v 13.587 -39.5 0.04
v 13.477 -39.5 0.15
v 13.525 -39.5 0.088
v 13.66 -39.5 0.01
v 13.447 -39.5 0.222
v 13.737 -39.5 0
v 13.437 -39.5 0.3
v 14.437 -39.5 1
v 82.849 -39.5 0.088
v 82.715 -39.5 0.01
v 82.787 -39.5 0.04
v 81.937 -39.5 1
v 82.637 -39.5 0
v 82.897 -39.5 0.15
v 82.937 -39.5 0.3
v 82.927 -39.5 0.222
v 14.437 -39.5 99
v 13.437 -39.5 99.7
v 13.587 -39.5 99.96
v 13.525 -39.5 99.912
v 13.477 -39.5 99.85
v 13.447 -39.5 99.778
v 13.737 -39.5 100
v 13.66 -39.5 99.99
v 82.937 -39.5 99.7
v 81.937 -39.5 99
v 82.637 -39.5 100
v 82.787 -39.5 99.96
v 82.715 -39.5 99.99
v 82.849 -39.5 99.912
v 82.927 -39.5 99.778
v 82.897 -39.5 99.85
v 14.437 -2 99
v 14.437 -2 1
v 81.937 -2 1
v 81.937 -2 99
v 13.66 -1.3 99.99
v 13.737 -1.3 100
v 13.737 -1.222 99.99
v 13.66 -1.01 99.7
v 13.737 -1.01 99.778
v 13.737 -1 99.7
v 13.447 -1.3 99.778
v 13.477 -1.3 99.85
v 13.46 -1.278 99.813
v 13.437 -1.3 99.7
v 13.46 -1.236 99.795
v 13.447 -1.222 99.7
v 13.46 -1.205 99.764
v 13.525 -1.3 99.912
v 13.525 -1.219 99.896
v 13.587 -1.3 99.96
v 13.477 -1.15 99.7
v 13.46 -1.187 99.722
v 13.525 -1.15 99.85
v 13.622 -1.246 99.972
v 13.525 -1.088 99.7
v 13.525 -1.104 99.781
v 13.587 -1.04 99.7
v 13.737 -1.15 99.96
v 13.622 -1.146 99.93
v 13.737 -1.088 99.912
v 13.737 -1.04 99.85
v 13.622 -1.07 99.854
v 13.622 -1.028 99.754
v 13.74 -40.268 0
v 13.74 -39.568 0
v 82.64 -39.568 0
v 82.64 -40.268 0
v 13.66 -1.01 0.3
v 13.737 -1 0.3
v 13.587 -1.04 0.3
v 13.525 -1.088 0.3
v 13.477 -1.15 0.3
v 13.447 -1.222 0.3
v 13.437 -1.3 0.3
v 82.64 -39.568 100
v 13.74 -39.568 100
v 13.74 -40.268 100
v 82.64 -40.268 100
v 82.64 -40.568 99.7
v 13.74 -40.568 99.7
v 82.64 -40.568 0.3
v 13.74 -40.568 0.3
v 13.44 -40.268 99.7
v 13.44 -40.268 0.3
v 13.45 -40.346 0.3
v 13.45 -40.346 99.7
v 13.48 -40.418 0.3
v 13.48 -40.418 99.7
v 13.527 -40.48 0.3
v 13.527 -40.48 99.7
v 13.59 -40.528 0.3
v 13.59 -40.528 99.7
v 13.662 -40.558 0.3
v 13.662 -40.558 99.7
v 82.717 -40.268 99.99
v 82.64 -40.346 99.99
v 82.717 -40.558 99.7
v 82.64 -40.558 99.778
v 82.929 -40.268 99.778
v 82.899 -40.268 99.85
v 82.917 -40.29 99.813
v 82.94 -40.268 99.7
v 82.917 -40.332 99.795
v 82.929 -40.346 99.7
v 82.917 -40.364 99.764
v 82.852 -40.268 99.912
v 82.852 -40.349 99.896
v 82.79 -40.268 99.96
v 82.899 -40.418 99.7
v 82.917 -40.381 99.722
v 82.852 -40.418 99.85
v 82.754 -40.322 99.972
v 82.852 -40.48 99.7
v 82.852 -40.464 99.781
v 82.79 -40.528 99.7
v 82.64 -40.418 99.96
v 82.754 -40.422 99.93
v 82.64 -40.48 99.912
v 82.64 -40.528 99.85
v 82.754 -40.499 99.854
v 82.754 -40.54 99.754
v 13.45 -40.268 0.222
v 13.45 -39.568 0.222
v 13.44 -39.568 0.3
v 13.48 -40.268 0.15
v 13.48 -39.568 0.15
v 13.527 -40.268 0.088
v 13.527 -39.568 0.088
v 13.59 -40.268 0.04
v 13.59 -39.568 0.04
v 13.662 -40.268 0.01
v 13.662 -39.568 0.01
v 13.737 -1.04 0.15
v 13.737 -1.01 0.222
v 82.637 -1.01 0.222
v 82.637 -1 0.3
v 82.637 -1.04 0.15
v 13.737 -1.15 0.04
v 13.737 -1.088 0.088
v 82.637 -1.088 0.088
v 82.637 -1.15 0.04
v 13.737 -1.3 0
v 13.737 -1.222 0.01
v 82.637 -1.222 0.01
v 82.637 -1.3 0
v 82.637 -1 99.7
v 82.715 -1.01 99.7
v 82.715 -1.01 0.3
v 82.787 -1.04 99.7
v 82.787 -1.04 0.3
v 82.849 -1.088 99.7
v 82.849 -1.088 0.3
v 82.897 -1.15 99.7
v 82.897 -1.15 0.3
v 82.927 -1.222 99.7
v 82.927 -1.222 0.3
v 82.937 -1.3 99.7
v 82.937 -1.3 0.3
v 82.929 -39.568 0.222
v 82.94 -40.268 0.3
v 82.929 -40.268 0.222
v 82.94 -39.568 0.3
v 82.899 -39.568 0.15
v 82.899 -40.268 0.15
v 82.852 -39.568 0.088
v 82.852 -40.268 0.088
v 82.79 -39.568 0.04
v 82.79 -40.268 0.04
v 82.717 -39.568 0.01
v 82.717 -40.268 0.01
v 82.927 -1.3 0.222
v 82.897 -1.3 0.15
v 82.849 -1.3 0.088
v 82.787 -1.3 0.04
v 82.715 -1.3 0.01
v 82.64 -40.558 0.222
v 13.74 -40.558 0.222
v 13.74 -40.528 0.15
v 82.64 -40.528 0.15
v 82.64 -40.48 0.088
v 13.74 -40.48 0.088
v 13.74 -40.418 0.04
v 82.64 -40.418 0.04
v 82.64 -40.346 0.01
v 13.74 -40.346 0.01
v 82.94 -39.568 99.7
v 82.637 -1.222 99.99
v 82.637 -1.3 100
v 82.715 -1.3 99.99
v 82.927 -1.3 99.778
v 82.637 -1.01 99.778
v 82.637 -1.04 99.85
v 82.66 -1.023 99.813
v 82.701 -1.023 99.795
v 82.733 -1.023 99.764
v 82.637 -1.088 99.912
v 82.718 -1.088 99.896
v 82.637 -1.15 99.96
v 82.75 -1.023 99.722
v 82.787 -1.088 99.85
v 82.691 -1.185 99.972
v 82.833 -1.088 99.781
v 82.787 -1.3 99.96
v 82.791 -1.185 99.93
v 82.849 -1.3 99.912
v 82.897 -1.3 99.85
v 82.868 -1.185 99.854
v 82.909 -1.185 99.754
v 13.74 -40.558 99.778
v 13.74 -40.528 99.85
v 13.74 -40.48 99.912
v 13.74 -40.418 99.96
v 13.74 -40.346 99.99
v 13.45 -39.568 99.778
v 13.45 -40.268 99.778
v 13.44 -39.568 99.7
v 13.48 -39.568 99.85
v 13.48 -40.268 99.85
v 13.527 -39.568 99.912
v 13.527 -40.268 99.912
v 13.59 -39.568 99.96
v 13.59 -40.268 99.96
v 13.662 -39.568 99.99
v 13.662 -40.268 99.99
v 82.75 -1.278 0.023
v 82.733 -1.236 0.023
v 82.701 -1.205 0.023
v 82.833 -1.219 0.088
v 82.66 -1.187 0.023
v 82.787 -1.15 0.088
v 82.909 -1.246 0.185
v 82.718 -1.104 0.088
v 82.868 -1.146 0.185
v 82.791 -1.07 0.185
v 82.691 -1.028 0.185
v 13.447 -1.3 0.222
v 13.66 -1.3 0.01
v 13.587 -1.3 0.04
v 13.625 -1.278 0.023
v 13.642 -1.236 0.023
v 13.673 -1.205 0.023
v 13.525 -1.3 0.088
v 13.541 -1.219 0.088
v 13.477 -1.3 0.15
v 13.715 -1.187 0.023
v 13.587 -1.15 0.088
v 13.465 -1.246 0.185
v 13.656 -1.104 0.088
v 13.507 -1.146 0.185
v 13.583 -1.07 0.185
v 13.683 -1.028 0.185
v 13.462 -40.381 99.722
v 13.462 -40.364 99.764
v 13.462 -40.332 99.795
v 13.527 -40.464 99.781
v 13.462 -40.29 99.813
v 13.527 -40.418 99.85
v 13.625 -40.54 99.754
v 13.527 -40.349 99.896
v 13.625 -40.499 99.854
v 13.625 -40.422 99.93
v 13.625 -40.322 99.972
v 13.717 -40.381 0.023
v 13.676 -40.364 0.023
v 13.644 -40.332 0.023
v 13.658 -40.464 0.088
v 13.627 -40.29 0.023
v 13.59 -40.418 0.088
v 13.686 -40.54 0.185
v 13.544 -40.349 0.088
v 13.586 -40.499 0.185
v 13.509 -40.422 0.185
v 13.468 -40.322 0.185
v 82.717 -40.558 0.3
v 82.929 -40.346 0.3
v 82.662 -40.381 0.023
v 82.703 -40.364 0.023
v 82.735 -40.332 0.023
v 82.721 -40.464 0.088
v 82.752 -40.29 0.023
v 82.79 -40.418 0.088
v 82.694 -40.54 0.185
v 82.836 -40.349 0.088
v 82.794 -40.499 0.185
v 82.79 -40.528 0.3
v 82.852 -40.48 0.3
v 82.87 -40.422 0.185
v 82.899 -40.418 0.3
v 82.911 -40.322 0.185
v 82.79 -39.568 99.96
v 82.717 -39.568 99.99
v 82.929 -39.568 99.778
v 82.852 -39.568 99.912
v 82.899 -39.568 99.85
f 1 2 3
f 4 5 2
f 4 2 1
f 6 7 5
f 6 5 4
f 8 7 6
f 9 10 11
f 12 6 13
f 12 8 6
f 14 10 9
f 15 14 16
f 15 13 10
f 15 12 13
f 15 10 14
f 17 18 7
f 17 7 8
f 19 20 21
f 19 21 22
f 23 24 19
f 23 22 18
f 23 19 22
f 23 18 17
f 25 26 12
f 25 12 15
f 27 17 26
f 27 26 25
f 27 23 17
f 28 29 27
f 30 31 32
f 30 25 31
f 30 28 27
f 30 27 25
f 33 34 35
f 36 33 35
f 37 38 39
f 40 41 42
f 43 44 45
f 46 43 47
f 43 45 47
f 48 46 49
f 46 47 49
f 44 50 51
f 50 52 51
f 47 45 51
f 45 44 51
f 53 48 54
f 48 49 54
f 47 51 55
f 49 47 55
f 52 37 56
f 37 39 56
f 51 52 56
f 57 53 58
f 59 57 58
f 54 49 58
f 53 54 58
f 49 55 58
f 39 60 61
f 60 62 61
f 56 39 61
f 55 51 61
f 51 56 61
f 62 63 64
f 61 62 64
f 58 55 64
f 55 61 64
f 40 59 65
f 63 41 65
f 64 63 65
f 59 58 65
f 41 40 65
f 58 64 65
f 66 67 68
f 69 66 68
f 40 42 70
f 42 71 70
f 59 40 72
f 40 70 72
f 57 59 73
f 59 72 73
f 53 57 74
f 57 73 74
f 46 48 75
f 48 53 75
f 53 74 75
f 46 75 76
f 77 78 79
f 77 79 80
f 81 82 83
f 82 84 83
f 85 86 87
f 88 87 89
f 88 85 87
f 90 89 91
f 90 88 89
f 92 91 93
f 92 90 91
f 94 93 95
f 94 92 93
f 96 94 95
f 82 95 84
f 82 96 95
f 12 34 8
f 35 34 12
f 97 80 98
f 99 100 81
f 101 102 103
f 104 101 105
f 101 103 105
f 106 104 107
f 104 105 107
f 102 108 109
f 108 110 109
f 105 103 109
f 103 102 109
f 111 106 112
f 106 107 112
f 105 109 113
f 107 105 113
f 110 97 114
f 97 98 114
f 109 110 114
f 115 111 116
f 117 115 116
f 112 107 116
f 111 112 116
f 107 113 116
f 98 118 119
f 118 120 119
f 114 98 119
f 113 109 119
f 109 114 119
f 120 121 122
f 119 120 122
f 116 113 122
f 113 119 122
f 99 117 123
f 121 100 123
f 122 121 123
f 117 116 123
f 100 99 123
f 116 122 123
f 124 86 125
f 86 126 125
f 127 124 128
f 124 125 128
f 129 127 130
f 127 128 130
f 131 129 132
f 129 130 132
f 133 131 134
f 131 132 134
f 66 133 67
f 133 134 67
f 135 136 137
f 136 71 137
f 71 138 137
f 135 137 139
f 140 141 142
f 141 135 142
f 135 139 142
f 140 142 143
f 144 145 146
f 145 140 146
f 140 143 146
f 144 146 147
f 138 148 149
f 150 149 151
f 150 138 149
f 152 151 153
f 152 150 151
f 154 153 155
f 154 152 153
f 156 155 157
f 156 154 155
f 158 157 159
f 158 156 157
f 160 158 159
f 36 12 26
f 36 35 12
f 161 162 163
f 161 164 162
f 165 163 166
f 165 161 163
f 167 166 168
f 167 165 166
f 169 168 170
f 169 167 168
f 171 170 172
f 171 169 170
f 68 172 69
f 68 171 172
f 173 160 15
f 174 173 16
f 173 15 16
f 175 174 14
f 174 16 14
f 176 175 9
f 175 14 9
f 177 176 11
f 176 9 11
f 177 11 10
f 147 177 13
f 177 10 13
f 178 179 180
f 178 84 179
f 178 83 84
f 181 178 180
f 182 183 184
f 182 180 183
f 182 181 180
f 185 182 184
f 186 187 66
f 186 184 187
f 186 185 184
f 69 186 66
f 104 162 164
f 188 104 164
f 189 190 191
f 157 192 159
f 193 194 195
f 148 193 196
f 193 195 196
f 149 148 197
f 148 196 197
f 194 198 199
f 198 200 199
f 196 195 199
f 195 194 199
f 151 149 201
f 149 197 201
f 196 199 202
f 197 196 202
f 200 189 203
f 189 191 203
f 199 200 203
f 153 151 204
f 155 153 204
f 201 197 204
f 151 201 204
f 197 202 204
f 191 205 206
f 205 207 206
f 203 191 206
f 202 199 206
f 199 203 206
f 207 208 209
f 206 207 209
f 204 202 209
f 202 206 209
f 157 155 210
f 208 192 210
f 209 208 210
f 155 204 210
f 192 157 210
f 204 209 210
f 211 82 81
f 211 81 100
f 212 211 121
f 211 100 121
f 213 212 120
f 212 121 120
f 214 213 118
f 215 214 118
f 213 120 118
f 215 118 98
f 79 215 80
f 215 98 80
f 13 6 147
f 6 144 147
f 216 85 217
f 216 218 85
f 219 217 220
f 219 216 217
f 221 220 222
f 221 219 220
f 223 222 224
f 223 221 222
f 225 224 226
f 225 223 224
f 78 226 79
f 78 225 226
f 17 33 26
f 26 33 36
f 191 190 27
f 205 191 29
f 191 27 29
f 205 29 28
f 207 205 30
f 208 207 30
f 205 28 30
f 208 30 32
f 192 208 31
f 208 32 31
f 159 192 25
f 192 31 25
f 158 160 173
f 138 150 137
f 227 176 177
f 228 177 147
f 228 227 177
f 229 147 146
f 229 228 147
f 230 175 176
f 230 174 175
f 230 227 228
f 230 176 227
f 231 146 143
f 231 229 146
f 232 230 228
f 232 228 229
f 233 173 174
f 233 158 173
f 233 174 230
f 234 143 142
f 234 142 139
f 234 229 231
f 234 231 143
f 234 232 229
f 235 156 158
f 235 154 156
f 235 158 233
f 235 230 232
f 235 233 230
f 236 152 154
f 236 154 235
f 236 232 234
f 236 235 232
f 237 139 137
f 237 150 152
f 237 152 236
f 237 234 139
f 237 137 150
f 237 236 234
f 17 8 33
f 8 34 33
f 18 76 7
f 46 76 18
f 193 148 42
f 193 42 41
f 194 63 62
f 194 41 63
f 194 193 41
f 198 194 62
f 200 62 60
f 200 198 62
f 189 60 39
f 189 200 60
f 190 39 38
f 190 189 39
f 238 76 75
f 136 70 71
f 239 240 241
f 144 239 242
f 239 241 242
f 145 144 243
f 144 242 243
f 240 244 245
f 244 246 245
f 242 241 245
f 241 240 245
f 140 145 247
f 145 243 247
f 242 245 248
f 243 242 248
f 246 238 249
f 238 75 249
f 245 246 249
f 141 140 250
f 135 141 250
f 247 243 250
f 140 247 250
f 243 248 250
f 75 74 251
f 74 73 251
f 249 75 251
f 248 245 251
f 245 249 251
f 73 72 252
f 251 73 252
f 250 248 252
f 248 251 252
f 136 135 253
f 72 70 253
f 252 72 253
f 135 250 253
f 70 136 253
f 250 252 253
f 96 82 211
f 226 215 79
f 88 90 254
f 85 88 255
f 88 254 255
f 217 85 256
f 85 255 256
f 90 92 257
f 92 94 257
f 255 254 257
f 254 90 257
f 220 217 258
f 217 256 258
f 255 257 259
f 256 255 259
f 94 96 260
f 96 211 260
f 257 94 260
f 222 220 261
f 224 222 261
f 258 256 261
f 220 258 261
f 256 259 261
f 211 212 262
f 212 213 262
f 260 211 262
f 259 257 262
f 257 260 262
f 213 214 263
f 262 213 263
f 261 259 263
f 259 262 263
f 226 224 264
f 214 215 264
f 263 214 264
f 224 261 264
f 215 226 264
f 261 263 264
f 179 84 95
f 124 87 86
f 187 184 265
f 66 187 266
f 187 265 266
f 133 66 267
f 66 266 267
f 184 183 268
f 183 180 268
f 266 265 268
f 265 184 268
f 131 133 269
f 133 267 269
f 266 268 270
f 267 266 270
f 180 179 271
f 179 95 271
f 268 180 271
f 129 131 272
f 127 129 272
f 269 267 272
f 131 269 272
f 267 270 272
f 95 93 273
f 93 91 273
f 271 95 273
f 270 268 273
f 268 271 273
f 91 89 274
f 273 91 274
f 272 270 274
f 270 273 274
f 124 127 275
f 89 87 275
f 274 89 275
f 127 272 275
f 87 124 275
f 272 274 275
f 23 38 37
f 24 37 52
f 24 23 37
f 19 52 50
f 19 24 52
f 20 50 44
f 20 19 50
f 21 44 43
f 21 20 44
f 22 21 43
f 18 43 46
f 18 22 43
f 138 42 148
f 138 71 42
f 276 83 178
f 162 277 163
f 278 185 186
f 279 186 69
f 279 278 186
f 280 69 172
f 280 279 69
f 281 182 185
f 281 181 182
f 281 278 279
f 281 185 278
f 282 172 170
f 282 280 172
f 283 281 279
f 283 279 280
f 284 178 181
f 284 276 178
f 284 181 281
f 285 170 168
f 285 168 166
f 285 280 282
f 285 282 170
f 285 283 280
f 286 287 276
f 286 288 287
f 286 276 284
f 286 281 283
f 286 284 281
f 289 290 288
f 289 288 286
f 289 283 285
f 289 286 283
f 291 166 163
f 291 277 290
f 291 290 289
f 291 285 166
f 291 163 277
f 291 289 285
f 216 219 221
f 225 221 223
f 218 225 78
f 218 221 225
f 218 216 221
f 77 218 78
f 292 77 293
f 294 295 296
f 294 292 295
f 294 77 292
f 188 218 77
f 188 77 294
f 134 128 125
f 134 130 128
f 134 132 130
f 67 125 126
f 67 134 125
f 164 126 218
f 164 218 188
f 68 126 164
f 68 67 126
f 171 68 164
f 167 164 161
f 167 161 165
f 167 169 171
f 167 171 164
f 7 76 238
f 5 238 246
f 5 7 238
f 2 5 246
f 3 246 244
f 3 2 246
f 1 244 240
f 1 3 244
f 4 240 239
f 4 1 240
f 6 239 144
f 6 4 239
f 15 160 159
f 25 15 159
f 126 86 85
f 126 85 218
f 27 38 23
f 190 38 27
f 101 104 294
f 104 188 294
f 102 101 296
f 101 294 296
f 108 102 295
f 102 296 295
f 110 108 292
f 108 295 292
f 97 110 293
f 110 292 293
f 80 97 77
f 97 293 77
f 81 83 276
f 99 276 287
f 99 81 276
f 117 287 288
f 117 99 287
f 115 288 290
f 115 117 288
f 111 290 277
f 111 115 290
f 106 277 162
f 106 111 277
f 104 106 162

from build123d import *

# Parameters (mm, degrees)
F0_W      = 69.5
F0_H      = 100
F1_DEPTH  = 39.5
F1_FACE_W = 69.5
F1_FACE_H = 100
F2_DEPTH  = 1
F3_T      = -1
F4_W      = 69.5
F4_H      = 1
F5_DEPTH  = 100
F6_R      = 0.3
F7_R      = 0.3
F7_2_R    = 0.3


with BuildPart() as f1:
    # F0 (on Front) → F1 (new body)
    with BuildSketch(Plane.XZ):
        with Locations((48.187214, 50)):
            Rectangle(F0_W, F0_H)
    extrude(amount=F1_DEPTH)

    # F1_face (on face) → F2 (cut)
    with BuildSketch(Plane(origin=(48.187214, 0, 50), x_dir=(1, 0, 0), z_dir=(0, 1, 0))):
        Rectangle(F1_FACE_W, F1_FACE_H)
    extrude(amount=-F2_DEPTH, mode=Mode.SUBTRACT)

    # F3
    f3_openings = [f1.faces().sort_by_distance(p)[0] for p in [
        (48.187214, -39.5, 50),
    ]]
    offset(amount=F3_T, openings=f3_openings)

    # F6
    f6_edges = [f1.edges().sort_by_distance(p)[0] for p in [
        (82.937214, -20.25, 100),
    ]]
    fillet(f6_edges, radius=F6_R)

    # F7
    f7_edges = [f1.edges().sort_by_distance(p)[0] for p in [
        (48.037214, -1, 100),
        (13.437214, -20.25, 100),
        (13.437214, -1, 50),
        (82.937214, -20.25, 0),
        (13.437214, -20.25, 0),
        (48.187214, -1, 0),
        (82.937214, -1, 49.85),
    ]]
    fillet(f7_edges, radius=F7_R)


with BuildPart() as f5:
    # F4 (on Top) → F5 (new body)
    with BuildSketch(Plane.XY):
        with Locations((48.189588, -40.068087)):
            Rectangle(F4_W, F4_H)
    extrude(amount=F5_DEPTH)

    # F7#2
    f7_2_edges = [f5.edges().sort_by_distance(p)[0] for p in [
        (48.189588, -40.568087, 100),
        (13.439588, -40.568087, 50),
        (13.439588, -40.068087, 100),
        (82.939588, -40.068087, 100),
        (82.939588, -40.568087, 50),
        (48.189588, -40.568087, 0),
        (82.939588, -40.068087, 0),
        (13.439588, -40.068087, 0),
    ]]
    fillet(f7_2_edges, radius=F7_2_R)


solid = Compound([f1.part, f5.part])
